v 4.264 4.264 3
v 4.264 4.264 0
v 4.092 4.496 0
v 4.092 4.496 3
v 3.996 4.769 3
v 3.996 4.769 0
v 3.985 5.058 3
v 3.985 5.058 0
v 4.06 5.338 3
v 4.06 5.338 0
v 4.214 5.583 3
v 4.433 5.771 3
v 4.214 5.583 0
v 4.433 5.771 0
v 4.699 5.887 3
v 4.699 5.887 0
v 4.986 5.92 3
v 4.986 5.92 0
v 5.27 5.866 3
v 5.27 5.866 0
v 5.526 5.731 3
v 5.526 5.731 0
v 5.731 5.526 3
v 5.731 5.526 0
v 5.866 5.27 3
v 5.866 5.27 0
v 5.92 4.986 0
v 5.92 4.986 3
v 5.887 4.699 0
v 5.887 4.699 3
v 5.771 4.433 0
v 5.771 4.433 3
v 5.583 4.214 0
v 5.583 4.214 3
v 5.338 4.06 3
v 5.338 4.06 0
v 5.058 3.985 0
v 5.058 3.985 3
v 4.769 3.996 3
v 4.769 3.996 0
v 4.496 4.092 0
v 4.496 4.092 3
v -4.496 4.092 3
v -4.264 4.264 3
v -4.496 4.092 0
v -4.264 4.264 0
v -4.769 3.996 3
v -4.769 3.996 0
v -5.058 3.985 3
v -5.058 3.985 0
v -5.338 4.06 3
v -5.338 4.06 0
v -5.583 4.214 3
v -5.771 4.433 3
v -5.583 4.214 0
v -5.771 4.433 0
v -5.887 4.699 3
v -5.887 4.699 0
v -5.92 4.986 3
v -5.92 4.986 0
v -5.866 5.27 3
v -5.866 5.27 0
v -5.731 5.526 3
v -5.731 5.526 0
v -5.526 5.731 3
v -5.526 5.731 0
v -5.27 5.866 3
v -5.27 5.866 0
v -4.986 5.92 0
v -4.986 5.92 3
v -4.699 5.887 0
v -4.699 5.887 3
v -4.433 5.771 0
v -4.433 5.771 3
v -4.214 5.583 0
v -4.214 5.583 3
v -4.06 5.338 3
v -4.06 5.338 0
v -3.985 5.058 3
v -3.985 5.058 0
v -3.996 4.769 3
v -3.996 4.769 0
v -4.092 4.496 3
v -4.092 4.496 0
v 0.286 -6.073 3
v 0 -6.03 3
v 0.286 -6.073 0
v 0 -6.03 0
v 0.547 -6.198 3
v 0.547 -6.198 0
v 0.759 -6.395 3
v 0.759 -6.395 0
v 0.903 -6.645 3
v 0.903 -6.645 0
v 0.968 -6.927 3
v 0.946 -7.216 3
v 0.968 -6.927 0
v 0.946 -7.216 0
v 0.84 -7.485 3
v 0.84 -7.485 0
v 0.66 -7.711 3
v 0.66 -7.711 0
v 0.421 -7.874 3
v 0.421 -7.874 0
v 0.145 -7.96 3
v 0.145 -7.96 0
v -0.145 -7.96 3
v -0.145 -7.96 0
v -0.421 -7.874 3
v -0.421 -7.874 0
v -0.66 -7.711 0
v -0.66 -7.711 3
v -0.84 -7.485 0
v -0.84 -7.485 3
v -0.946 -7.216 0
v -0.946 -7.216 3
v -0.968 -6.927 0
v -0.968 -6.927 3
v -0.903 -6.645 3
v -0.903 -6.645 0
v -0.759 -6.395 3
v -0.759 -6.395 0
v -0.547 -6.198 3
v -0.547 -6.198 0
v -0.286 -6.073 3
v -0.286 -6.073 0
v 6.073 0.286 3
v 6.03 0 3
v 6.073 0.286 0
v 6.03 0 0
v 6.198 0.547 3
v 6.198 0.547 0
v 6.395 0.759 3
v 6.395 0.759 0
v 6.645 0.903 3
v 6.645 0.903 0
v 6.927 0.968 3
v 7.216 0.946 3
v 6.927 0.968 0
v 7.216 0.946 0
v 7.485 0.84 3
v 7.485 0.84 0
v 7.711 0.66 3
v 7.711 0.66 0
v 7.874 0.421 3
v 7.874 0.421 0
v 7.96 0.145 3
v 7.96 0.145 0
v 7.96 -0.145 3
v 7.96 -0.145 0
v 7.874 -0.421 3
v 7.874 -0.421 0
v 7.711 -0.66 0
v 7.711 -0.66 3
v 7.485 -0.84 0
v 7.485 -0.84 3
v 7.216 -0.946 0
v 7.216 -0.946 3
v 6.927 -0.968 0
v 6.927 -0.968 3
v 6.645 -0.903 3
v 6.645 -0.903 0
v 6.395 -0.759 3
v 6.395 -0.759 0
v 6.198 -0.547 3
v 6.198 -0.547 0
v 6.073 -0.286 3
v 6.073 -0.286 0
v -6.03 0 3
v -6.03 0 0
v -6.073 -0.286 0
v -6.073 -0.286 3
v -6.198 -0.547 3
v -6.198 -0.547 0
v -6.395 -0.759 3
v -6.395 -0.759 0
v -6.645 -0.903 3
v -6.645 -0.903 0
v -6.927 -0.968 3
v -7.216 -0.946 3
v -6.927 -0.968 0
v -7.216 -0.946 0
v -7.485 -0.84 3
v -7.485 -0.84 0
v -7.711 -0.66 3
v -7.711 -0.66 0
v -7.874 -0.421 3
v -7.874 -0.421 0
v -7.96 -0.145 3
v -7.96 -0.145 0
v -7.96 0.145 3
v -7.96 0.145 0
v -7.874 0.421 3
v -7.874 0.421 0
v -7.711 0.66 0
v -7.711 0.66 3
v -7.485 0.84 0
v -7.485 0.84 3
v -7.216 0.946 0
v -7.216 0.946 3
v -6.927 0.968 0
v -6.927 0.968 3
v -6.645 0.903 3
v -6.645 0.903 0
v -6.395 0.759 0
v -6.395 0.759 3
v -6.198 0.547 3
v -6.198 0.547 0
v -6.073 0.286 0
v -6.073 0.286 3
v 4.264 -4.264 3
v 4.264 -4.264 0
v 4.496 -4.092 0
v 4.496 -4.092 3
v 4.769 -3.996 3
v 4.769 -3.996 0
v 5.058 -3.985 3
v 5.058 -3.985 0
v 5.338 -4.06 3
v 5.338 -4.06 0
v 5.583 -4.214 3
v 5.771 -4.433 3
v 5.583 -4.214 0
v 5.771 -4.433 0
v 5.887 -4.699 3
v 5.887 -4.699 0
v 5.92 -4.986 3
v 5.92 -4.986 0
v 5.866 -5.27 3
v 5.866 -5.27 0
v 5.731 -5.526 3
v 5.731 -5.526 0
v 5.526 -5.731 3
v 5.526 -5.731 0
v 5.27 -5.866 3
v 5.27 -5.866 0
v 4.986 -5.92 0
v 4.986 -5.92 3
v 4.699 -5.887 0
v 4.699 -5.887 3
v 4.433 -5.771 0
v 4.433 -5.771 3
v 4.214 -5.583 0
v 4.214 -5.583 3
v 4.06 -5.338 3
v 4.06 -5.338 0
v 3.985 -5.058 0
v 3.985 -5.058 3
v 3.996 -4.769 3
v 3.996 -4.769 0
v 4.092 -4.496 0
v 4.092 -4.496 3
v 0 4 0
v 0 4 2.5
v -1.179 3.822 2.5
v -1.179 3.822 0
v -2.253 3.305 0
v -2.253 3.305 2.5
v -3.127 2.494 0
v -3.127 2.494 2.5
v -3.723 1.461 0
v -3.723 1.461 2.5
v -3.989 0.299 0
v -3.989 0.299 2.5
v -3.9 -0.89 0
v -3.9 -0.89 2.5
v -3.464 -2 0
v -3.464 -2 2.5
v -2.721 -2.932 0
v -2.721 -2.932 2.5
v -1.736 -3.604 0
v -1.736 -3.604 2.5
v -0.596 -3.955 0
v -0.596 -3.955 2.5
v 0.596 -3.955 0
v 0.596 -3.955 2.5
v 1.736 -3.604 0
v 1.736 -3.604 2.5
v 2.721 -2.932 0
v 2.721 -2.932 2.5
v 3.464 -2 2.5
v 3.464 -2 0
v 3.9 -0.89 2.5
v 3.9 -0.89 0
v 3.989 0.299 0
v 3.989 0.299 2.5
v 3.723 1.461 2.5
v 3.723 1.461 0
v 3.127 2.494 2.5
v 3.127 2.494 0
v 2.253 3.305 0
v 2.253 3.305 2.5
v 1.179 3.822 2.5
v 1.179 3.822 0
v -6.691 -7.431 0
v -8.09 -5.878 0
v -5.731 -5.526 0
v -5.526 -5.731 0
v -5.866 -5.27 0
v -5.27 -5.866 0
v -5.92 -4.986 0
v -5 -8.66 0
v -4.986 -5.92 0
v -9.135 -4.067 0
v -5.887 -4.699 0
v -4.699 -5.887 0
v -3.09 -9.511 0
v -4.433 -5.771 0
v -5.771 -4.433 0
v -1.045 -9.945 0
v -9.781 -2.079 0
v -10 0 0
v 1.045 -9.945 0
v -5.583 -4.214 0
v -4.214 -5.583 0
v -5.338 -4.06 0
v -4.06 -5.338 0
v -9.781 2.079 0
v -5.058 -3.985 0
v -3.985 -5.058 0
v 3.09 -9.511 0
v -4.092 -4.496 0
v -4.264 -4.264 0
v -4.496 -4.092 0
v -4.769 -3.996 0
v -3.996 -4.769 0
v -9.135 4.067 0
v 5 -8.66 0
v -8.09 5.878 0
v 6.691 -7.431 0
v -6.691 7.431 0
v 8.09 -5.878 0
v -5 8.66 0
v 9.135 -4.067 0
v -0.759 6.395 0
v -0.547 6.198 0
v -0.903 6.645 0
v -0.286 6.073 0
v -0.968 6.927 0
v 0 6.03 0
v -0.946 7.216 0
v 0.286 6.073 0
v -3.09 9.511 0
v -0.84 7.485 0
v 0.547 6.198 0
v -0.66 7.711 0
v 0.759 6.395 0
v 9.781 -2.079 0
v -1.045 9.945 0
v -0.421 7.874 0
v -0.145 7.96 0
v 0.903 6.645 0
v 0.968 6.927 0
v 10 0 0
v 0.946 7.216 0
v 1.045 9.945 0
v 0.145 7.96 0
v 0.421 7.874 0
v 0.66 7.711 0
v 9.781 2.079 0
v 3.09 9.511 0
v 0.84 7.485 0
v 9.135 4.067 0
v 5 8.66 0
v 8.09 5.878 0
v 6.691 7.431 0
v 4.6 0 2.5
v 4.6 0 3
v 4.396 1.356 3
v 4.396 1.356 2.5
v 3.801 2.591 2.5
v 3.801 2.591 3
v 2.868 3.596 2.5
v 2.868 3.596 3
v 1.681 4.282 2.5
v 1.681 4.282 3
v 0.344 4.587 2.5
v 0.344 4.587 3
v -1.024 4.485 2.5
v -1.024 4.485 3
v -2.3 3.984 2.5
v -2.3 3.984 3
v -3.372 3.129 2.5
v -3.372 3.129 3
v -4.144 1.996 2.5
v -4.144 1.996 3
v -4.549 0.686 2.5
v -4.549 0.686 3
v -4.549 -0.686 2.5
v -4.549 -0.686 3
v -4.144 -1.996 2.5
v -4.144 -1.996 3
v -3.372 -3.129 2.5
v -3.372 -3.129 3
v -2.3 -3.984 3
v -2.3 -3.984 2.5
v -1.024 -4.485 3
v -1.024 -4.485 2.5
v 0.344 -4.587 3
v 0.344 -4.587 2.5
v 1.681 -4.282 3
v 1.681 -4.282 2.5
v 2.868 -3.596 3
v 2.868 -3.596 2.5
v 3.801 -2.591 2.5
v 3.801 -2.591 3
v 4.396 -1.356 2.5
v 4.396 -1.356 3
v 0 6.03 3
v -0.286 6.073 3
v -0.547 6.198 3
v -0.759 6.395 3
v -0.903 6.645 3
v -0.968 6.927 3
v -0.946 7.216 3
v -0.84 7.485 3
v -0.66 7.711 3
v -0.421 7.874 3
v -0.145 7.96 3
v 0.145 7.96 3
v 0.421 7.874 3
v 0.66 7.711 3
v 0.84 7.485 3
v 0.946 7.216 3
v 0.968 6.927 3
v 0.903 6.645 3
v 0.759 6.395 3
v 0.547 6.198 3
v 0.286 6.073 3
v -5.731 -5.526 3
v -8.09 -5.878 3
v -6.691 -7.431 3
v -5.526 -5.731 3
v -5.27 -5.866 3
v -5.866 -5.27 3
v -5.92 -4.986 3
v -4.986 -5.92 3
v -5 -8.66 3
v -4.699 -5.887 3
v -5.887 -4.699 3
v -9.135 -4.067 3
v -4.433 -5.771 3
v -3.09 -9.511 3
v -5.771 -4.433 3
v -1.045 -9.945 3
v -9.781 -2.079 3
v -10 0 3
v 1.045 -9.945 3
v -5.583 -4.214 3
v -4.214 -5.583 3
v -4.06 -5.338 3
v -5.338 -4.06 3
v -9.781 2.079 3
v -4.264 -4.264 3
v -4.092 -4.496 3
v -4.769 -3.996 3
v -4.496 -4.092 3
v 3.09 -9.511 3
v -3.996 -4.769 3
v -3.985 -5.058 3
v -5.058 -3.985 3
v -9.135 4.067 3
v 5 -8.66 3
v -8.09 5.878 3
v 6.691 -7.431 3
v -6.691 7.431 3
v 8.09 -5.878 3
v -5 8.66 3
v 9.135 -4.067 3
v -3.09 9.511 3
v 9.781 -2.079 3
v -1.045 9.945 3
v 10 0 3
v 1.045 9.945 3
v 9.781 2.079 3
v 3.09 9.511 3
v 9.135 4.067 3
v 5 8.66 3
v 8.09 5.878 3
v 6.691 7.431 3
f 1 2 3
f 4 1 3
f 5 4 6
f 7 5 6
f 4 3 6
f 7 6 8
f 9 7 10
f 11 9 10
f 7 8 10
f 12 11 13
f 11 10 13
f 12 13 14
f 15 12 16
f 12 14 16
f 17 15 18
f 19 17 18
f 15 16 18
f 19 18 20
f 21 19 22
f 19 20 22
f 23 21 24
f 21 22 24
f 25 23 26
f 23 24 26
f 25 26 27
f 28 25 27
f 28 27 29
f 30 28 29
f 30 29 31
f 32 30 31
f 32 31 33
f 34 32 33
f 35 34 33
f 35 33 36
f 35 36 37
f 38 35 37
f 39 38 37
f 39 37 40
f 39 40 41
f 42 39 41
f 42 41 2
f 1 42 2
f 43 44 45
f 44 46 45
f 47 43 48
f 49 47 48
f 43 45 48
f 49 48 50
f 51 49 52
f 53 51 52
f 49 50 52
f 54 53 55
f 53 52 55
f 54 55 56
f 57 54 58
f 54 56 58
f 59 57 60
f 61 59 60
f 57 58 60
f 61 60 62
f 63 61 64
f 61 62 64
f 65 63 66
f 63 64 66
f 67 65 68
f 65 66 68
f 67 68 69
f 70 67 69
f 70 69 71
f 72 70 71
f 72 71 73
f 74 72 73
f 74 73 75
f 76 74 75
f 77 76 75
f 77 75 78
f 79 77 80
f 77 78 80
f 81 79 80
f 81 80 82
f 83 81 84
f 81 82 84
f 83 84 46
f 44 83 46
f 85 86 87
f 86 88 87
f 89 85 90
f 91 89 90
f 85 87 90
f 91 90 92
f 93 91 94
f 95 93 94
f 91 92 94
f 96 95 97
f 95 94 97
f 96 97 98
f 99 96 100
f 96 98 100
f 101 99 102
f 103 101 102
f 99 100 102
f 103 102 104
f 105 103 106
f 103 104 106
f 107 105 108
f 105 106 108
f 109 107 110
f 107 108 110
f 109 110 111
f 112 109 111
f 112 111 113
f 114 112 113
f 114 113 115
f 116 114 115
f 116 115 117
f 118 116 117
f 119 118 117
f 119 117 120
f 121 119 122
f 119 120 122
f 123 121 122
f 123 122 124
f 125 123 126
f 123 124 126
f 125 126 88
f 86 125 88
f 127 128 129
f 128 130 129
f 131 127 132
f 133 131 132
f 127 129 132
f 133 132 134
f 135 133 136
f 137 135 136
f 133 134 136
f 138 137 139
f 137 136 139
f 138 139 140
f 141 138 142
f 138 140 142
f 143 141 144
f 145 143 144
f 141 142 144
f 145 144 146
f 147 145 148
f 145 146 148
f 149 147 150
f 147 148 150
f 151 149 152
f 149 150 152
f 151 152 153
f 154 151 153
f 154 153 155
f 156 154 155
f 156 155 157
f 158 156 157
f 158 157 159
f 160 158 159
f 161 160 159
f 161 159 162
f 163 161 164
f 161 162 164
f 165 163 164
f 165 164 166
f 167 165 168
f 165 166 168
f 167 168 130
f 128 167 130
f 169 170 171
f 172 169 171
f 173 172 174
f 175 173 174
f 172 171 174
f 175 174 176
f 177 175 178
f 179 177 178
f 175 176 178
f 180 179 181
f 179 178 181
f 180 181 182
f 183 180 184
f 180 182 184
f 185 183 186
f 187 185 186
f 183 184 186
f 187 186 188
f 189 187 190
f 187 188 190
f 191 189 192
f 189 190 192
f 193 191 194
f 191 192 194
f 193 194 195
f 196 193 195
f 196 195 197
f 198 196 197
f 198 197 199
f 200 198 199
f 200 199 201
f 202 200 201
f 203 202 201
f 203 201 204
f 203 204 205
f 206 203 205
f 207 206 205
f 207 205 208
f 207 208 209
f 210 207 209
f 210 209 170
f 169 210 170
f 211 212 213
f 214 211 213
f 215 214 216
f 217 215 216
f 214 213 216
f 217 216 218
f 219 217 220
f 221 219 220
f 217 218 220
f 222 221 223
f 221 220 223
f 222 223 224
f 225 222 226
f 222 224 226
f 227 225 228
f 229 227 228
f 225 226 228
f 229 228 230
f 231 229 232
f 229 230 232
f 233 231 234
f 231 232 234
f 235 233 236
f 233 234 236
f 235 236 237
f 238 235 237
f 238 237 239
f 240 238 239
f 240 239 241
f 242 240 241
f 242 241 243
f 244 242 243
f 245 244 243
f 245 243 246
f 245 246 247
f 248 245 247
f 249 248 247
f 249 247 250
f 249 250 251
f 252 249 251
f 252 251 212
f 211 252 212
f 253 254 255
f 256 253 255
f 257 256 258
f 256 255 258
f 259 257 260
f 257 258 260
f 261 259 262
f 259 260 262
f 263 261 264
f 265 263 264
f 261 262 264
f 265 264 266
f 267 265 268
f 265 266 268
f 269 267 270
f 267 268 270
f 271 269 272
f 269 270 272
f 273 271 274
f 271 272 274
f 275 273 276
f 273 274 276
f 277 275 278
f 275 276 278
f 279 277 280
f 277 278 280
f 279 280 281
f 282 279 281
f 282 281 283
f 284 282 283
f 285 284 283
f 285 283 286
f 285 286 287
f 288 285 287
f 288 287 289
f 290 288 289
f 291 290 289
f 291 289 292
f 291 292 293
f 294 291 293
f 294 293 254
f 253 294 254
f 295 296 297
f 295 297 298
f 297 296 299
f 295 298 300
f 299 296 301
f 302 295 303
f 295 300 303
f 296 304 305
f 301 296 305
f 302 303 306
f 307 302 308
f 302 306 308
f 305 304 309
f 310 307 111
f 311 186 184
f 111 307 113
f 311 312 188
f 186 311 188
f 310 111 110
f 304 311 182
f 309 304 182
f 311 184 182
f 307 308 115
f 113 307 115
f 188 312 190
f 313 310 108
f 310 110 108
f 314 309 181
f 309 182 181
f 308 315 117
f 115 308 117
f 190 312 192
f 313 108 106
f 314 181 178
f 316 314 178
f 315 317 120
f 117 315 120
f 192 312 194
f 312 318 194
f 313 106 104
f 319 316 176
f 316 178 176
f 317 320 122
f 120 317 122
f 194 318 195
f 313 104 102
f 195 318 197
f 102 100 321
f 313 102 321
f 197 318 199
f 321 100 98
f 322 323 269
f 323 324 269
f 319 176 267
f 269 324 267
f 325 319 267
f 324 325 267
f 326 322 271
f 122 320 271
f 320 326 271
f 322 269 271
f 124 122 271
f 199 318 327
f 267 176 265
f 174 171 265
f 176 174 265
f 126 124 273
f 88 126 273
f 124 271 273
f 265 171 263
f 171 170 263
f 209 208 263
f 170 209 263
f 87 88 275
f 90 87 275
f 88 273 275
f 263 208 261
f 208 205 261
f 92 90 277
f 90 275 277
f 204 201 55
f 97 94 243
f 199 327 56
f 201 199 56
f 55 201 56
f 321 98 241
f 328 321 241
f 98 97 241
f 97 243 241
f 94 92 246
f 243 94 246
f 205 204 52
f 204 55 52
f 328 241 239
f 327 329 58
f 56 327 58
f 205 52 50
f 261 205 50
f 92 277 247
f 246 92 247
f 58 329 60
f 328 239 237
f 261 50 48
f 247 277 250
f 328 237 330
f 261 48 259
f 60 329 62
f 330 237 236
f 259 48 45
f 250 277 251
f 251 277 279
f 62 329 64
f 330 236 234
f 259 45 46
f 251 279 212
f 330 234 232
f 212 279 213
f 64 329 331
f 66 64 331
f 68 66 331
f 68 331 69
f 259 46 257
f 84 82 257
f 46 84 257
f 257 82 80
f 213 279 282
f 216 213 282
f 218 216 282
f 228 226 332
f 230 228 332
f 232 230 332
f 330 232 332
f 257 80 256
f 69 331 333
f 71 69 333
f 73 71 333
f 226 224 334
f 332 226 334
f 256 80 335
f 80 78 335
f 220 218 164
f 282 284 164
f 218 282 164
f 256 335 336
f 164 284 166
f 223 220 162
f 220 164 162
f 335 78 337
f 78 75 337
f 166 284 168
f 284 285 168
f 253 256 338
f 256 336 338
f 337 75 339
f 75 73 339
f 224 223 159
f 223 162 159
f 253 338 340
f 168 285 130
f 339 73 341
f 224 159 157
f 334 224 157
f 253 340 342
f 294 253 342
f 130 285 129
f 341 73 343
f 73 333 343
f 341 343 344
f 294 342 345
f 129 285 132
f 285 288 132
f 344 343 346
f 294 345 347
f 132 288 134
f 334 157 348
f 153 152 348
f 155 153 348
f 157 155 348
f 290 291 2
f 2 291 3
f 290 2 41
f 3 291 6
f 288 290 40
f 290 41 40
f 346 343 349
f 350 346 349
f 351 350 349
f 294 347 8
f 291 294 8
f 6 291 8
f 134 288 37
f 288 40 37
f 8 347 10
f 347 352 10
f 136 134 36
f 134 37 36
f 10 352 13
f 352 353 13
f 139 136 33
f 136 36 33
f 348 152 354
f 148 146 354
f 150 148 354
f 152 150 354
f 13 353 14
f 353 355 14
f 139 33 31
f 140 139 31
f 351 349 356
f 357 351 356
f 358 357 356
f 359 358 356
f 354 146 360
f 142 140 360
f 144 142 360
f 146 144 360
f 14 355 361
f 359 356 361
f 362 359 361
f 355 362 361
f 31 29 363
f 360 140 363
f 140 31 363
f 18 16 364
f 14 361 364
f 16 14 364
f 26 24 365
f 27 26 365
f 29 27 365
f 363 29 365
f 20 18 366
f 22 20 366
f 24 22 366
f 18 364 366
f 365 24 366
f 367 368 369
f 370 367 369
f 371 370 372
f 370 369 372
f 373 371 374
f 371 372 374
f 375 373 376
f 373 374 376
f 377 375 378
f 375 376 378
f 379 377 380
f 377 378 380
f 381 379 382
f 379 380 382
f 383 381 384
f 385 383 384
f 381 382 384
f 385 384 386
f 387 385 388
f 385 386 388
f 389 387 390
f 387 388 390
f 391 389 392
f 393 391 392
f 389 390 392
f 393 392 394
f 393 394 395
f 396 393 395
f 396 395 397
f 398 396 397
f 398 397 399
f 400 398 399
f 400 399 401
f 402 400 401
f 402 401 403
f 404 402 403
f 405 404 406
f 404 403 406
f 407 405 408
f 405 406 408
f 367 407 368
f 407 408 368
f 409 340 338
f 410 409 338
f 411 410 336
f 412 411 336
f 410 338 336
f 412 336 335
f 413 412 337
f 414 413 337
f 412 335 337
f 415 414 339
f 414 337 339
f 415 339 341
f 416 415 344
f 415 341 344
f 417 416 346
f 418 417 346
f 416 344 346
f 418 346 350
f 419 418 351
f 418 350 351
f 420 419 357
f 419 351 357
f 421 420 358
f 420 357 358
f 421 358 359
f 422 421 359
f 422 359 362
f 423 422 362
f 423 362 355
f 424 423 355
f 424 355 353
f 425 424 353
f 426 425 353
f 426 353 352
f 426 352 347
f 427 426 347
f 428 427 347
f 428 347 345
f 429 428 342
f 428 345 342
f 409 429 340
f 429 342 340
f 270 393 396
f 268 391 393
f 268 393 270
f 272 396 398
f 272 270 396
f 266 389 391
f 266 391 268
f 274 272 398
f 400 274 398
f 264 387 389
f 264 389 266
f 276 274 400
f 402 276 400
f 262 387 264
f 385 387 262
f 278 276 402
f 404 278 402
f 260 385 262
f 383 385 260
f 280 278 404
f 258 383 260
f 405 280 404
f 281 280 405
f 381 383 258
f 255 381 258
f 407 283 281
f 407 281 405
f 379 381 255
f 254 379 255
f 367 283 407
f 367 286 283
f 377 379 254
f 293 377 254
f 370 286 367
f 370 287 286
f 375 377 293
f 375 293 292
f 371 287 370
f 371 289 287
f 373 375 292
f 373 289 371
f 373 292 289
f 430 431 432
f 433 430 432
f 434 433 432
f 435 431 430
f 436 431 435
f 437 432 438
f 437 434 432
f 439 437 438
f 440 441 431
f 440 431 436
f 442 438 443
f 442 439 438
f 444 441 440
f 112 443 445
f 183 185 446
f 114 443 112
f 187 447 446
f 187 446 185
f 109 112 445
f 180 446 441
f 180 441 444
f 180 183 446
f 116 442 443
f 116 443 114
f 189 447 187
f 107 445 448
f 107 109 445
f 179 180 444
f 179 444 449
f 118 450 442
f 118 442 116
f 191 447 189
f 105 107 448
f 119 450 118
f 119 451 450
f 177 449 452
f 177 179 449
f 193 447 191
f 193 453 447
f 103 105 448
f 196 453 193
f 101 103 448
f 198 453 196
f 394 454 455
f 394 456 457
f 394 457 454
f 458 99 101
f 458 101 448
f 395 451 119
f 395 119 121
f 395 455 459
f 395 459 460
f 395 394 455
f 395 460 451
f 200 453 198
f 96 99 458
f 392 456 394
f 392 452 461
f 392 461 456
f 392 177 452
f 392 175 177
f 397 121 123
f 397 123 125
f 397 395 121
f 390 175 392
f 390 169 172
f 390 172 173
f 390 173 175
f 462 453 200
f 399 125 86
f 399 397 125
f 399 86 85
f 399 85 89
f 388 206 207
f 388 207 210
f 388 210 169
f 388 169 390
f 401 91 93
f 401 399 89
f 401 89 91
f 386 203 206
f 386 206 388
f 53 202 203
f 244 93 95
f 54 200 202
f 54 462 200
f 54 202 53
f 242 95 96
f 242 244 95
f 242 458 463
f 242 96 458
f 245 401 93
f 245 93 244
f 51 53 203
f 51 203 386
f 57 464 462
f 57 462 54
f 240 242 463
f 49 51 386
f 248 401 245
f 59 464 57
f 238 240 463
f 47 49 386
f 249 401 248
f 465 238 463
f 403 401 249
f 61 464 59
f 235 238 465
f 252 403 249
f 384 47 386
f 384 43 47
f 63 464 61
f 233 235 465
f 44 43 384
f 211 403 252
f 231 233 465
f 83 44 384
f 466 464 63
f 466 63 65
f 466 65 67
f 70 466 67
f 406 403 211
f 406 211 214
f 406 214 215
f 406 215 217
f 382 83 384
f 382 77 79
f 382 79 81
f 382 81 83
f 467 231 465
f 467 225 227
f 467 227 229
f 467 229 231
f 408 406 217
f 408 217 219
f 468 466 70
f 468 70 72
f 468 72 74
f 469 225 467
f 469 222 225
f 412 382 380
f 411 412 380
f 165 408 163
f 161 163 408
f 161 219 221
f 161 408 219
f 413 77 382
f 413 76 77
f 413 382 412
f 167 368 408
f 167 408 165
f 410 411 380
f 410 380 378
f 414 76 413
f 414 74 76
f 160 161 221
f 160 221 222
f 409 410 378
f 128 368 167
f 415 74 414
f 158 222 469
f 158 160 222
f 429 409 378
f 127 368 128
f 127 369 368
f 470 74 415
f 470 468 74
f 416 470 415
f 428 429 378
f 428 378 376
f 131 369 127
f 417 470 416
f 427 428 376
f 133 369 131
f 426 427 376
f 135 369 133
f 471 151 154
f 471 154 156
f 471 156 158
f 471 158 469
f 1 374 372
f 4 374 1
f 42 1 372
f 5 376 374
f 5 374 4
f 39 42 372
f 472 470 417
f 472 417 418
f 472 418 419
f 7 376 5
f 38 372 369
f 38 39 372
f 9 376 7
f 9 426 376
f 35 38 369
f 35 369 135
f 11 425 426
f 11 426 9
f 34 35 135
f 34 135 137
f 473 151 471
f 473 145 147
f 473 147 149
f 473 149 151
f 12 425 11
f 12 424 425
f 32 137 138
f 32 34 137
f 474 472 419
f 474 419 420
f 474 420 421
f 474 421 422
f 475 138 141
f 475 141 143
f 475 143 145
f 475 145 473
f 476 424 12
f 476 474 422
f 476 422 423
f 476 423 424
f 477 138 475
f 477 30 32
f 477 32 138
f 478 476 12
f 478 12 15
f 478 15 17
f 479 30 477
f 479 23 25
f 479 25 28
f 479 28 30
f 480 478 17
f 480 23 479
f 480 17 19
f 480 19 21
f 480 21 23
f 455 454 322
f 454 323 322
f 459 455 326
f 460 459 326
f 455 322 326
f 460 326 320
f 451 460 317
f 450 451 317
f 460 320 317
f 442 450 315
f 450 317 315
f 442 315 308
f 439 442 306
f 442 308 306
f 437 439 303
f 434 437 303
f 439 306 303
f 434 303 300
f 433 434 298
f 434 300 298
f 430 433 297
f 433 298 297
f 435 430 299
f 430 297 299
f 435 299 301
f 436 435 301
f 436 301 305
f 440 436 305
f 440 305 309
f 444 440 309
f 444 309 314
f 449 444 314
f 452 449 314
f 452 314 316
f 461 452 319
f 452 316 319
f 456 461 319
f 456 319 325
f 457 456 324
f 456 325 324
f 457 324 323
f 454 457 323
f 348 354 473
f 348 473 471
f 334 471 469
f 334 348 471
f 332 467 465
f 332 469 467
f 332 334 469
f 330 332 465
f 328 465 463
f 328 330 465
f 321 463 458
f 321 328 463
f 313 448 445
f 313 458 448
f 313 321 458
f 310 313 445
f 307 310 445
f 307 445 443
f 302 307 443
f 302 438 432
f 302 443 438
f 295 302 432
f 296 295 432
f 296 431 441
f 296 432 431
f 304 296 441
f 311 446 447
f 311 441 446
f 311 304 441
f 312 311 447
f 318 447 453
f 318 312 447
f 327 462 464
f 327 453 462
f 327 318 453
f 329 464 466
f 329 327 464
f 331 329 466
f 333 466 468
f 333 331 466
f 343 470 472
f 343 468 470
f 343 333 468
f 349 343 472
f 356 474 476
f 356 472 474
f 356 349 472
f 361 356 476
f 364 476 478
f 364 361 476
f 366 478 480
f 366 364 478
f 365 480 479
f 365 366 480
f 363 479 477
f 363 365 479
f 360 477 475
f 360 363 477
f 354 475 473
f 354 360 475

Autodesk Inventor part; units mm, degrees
ref_plane "YZ Plane" through (0, 0, 0) normal (1, 0, 0) x (0, 1, 0)
ref_plane "XZ Plane" through (0, 0, 0) normal (0, 1, 0) x (-1, 0, 0)
ref_plane "XY Plane" through (0, 0, 0) normal (0, 0, 1) x (1, 0, 0)
sketch "スケッチ1" plane through (0, 0, 0) normal (0, 0, 1) x (1, 0, 0)
  circle A0 centre (0, 0) radius 10
  dimension "d0" = 20
extrude "押し出し1" add sketch "スケッチ1" along normal blind 3
sketch "スケッチ5" plane through (0, 0, 3) normal (0, 0, 1) x (1, 0, 0)
  circle A0 centre (0, 7) radius 1
  circle A1 centre (0, 0) radius 10 projected
  dimension "d30" = 2
  dimension "d77" = 0
  dimension "d78" = 7
hole "穴4" at (0, 7, 3) direction (0, 0, -1) diameter 1.941 end through all thread size "3-48 UNC" class "2B" standard "ANSI Unified Screw Threads"
sketch "スケッチ6" plane through (0, 0, 0) normal (0, 0, -1) x (-1, 0, 0)
  circle A0 centre (0, 0) radius 10 projected
  circle A1 centre (0, 0) radius 4.05
  dimension "d66" = 8.1
hole "穴5" at (0, 0, 0) direction (0, 0, 1) diameter 8 end through all
sketch "スケッチ2" plane through (0, 0, 3) normal (0, 0, 1) x (1, 0, 0)
  circle A0 centre (0, 0) radius 10 projected
  circle A1 centre (0, 0) radius 4.6
  dimension "d3" = 9.2
extrude "押し出し4" cut sketch "スケッチ2" against normal blind 0.5 contours A1
pattern_circular "円形状パターン3" count 8 over 360 about axis through (0, 0, 28.4429) along (0, 0, -1) of "穴4"
properties part number "03" material "アルミニウム 6061"
